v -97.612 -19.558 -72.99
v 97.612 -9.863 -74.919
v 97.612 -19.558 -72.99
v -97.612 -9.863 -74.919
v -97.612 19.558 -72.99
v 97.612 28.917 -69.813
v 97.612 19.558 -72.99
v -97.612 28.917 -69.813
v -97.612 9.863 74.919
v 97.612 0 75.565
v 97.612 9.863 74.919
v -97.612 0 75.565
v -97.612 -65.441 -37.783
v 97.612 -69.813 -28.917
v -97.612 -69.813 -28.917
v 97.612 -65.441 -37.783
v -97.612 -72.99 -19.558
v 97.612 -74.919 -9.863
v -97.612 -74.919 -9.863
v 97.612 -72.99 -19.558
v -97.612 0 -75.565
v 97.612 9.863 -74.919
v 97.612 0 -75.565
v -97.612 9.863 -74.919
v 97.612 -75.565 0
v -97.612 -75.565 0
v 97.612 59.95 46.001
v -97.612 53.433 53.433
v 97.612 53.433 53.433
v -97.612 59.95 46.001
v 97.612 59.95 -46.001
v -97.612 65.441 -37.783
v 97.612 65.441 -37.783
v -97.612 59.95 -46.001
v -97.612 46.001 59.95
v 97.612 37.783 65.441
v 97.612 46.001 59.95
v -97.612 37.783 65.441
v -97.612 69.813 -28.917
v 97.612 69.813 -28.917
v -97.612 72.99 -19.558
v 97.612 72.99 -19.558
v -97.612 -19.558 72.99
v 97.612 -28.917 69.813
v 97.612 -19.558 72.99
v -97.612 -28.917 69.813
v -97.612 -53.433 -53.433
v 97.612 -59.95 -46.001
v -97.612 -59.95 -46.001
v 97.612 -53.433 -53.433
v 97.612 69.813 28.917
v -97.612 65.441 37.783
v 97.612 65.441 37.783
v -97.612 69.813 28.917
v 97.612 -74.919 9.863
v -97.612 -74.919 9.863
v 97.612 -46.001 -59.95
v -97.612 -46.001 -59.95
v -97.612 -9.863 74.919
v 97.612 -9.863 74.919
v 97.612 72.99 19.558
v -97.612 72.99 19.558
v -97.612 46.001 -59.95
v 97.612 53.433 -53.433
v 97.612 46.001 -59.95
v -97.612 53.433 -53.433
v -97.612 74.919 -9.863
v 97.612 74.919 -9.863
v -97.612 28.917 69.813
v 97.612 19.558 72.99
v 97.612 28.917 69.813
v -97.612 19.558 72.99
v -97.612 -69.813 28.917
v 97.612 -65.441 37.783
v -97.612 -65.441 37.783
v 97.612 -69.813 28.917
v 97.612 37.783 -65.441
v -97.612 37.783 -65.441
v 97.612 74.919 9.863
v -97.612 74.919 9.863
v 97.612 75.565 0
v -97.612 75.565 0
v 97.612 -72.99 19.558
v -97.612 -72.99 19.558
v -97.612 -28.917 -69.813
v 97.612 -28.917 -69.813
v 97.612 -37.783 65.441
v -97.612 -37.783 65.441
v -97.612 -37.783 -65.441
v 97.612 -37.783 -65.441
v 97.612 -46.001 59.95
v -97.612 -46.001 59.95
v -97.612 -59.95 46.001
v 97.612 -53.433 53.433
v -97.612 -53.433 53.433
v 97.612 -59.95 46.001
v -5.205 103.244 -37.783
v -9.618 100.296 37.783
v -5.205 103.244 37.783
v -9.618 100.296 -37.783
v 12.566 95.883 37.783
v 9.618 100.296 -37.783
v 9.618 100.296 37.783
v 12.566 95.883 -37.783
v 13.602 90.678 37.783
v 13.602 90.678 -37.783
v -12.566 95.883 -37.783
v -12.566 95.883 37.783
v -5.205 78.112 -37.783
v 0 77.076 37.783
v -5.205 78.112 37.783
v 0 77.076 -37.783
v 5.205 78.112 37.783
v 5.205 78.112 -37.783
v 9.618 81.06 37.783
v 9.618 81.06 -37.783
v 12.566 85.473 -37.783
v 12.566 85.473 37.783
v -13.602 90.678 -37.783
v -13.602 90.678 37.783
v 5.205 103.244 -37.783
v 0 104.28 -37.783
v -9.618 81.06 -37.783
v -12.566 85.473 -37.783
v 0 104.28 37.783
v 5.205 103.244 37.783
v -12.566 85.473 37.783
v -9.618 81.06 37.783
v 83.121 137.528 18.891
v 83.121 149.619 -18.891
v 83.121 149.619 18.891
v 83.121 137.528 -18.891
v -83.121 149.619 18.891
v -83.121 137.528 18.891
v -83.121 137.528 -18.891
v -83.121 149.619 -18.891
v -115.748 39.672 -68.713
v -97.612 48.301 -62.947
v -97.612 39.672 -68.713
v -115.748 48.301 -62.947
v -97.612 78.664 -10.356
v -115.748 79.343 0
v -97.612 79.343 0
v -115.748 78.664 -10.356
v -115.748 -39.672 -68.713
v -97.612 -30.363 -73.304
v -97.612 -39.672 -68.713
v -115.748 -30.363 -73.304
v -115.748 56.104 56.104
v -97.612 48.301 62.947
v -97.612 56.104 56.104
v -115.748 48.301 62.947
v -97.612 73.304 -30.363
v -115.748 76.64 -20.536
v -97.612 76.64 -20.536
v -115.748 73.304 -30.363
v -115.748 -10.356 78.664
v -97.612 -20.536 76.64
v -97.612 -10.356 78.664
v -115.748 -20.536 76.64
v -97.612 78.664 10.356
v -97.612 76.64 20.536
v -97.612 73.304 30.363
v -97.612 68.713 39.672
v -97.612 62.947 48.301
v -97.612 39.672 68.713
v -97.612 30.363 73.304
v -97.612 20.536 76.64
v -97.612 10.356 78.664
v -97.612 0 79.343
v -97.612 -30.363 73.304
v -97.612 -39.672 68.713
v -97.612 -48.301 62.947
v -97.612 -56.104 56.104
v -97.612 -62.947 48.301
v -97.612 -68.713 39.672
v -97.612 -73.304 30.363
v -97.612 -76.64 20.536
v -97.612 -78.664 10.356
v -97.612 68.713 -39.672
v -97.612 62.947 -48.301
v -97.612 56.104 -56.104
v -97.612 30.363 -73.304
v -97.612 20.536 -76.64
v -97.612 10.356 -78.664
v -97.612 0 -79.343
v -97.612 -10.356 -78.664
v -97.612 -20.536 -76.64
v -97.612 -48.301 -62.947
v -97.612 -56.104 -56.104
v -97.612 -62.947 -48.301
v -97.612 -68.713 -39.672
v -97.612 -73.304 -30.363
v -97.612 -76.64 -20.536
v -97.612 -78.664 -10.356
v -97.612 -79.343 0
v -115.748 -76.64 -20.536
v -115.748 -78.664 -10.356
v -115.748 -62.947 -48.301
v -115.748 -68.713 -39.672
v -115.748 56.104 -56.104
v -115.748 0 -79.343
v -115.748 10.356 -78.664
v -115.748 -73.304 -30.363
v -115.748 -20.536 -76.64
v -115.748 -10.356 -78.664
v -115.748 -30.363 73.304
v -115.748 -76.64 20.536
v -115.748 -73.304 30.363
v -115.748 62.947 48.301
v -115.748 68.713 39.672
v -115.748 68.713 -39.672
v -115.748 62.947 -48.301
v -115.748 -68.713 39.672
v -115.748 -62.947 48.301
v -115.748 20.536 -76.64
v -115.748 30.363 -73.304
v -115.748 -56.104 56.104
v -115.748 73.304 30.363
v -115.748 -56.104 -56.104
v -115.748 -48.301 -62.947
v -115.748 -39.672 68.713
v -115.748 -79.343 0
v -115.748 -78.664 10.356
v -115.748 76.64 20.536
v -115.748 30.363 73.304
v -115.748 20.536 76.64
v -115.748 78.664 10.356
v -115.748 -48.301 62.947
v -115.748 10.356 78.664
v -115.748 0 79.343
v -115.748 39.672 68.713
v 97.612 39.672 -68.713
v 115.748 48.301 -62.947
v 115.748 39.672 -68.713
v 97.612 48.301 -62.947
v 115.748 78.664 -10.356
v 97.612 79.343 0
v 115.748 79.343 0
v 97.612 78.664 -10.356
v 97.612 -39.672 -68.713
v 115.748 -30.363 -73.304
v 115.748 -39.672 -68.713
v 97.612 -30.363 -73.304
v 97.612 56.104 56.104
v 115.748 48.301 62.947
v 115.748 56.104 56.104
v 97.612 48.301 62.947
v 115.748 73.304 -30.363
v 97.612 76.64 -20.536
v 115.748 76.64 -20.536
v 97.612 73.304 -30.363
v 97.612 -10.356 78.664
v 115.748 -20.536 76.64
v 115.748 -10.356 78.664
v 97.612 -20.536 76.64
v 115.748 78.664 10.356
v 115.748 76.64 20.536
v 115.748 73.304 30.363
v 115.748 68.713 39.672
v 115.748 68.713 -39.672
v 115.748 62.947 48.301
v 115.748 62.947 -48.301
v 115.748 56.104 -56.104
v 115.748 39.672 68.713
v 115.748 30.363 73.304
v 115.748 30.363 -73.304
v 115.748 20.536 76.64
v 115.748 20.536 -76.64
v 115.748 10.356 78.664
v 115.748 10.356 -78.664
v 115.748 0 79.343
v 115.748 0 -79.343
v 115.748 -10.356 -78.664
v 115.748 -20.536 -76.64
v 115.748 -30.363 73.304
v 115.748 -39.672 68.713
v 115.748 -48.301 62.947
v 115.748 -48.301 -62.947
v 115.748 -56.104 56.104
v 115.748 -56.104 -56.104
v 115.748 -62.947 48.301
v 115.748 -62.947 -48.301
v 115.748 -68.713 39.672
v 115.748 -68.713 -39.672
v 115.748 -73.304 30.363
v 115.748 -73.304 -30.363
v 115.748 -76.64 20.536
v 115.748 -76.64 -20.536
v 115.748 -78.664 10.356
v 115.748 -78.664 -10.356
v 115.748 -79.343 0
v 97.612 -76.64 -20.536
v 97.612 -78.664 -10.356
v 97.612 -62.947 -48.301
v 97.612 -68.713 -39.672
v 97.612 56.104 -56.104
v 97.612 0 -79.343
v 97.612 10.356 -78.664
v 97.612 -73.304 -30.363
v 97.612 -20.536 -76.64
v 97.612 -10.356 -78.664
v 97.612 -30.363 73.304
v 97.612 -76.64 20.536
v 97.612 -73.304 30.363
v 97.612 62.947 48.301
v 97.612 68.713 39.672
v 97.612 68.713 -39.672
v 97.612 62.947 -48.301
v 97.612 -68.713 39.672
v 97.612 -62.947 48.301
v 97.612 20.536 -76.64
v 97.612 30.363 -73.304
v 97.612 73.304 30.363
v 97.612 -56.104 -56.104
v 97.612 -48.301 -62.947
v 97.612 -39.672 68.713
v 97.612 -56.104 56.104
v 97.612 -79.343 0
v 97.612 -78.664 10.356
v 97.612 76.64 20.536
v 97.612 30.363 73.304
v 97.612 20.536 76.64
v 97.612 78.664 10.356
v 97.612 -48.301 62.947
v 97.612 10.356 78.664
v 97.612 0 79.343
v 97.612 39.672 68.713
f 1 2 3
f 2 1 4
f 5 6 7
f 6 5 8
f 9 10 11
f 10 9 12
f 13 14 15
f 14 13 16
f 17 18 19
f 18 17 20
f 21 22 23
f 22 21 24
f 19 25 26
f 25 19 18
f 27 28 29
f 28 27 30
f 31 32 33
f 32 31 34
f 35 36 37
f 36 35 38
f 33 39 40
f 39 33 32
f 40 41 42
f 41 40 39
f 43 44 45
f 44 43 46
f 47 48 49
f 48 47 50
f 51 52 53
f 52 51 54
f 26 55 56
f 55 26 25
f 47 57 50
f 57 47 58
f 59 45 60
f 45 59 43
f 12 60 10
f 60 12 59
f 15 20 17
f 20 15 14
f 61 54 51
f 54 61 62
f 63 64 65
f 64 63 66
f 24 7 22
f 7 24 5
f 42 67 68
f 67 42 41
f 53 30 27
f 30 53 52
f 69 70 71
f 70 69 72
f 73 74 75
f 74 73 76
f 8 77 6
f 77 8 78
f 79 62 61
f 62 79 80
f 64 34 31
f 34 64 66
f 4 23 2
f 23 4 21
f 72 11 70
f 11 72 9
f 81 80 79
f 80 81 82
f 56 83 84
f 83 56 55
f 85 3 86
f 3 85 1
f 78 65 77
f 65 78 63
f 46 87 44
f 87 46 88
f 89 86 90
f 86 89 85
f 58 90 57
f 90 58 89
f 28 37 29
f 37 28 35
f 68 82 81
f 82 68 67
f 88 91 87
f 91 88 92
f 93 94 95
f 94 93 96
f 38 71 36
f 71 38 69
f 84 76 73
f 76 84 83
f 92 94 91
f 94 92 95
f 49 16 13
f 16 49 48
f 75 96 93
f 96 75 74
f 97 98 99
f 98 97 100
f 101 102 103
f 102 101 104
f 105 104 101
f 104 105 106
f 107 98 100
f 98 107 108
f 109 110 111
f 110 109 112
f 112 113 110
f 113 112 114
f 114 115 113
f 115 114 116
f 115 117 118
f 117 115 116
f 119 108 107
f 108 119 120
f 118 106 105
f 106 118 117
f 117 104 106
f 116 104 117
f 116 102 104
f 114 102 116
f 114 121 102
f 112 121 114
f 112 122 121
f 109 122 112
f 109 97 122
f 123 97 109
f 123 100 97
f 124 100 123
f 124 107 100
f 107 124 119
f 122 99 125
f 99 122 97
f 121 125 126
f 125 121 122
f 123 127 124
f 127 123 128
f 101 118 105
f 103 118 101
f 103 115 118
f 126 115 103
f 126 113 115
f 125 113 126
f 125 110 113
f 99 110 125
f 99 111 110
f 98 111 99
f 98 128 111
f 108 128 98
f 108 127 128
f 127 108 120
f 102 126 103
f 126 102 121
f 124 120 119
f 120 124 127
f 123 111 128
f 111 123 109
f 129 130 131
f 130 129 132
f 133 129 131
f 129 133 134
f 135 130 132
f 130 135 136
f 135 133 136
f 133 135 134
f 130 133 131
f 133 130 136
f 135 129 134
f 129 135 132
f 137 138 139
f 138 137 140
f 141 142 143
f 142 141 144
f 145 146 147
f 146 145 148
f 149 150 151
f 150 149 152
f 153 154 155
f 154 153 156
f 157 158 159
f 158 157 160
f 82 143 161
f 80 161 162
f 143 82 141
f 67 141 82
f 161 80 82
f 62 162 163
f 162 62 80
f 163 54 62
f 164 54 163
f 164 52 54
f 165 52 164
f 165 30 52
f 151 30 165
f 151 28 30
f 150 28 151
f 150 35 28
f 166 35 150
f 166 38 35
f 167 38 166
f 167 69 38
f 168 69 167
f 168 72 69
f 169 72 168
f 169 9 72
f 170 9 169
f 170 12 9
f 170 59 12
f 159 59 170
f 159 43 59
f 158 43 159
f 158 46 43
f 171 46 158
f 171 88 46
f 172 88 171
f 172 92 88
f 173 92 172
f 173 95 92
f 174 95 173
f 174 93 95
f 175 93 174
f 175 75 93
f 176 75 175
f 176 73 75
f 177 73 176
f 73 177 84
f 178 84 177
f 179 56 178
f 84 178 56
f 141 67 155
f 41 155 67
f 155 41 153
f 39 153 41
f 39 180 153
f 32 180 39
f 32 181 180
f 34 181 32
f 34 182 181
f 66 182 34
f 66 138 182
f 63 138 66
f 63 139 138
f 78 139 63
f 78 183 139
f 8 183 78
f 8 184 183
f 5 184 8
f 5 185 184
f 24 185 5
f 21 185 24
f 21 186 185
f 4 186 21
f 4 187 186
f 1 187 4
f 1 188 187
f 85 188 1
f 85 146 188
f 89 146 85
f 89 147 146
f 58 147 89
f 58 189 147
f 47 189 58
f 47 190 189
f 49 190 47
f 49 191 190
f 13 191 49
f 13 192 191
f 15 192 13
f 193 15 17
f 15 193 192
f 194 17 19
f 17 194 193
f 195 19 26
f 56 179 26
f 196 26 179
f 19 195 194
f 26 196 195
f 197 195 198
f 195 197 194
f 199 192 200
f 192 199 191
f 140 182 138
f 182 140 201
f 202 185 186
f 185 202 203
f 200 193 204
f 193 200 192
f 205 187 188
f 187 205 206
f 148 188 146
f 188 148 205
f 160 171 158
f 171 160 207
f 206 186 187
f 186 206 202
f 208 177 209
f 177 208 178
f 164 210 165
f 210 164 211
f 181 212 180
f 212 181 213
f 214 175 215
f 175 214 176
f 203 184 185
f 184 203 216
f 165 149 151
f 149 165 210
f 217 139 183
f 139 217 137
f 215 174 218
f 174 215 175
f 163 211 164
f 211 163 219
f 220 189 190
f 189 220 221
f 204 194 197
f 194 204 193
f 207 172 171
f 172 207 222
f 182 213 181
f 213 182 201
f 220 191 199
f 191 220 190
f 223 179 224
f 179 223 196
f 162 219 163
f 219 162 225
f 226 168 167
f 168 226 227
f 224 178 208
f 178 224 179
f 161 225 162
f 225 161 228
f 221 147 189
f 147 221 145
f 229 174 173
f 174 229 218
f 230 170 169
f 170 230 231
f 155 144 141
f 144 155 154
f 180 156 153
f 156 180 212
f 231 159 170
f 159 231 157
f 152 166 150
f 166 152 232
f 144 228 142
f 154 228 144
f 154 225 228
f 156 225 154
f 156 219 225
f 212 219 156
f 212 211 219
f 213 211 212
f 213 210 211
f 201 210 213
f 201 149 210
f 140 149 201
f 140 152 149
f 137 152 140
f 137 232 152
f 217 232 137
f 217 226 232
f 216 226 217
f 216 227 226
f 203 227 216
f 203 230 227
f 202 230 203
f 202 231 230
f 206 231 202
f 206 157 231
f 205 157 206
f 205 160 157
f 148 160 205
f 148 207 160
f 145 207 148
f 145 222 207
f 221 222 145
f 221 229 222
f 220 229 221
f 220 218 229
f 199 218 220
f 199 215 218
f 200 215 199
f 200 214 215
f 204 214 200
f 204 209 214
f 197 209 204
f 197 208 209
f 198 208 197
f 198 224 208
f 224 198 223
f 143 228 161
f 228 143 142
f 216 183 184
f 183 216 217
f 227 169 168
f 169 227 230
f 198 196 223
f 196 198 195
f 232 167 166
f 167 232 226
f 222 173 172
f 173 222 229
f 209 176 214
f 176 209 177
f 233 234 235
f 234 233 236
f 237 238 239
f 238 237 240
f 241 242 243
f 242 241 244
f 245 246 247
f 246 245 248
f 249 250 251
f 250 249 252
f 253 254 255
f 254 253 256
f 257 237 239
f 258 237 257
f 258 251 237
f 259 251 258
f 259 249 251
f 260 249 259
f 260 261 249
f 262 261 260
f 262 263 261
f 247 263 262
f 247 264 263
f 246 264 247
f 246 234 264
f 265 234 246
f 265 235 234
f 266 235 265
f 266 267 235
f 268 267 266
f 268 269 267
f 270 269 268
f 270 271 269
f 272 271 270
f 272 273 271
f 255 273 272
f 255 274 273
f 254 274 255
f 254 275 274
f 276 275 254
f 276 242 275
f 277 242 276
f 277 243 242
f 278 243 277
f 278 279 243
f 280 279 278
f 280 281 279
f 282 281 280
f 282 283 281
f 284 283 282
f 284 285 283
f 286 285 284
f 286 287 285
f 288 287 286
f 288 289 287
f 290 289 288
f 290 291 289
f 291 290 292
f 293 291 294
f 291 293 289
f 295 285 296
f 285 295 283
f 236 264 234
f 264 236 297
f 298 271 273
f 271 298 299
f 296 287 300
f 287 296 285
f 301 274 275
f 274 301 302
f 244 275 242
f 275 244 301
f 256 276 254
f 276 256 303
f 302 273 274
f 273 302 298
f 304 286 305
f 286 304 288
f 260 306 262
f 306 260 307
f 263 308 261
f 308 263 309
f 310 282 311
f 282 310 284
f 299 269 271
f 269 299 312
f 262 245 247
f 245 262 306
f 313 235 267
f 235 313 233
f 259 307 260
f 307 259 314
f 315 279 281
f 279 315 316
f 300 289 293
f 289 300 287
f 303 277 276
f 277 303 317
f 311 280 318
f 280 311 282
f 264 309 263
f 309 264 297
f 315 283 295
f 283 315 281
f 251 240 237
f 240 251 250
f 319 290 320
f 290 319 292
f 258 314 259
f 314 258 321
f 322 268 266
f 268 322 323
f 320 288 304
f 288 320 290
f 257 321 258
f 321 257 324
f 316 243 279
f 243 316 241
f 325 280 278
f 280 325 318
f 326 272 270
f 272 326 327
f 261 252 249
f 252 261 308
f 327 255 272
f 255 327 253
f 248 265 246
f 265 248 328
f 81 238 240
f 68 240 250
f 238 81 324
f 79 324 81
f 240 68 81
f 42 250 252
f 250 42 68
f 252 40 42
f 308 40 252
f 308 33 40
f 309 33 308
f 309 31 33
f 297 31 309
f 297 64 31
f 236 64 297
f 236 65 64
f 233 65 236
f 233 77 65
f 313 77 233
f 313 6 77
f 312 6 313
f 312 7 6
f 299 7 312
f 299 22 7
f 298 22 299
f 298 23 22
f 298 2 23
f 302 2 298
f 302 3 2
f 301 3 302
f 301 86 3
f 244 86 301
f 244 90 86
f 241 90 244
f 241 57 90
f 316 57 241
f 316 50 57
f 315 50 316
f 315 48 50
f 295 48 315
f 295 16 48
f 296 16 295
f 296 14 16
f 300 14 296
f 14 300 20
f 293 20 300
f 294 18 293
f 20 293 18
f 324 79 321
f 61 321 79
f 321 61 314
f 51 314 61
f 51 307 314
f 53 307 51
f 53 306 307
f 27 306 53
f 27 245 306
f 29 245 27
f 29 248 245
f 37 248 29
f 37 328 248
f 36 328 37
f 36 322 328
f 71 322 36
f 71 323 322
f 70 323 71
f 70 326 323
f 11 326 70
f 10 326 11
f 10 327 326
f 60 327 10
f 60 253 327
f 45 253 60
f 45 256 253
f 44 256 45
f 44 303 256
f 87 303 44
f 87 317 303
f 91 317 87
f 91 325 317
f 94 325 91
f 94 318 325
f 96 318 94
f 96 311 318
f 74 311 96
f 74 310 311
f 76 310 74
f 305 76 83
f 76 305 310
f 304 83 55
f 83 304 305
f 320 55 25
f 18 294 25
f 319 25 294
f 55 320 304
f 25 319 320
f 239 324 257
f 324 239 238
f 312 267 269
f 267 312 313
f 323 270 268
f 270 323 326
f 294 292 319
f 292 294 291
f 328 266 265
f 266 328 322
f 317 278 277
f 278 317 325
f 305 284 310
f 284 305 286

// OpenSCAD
// Auto-generated by scripts/author_from_manifest.py (Phase D.3).
// Source: data/phase_d_manifest.json (sku_intent='nibco-lc-2000-butterfly-3in').
// Do not hand-edit — regenerate from the manifest.
//
// @part nibco_lc_2000_butterfly_3in
// @kind valve
// @category valve.butterfly
// @display-name "Nibco LC-2000 Grooved Butterfly Valve 3\" w/ Tamper Switch"
// @mfg nibco
// @mfg-pn LC-2000
// @listing UL FM
// @price-usd 255.00
// @install-minutes 30
// @crew foreman
// @param size_in number default=3 label="Size" unit="in"
// @port inlet position=[-0.05,0,0] direction=[-1,0,0] style=grooved size_in=3 role=run_a
// @port outlet position=[0.05,0,0] direction=[1,0,0] style=grooved size_in=3 role=run_b

size_in = 3.0;

function od_mm(nps) =
    nps ==   1  ? 33.4 :
    nps == 1.25 ? 42.2 :
    nps == 1.5  ? 48.3 :
    nps ==   2  ? 60.3 :
    nps == 2.5  ? 73.0 :
    nps ==   3  ? 88.9 :
    nps ==   4  ? 114.3 :
    nps ==   6  ? 168.3 :
    nps ==   8  ? 219.1 : 73.0;

od = od_mm(size_in);
body_len = od * 2.4;
body_d   = od * 1.7;

union() {
    // Valve body
    rotate([0, 90, 0])
        cylinder(h = body_len, d = body_d, center = true, $fn = 48);
    // Stem / handle indicator
    translate([0, body_d * 0.6, 0])
        cylinder(h = body_d * 0.5, d = body_d * 0.18, center = true, $fn = 16);
    translate([0, body_d * 0.95, 0])
        cube([body_d * 1.1, body_d * 0.08, body_d * 0.25], center = true);
    // End flanges
    translate([-body_len/2, 0, 0])
        rotate([0, 90, 0])
        cylinder(h = body_d * 0.12, d = body_d * 1.05, center = true, $fn = 48);
    translate([ body_len/2, 0, 0])
        rotate([0, 90, 0])
        cylinder(h = body_d * 0.12, d = body_d * 1.05, center = true, $fn = 48);
}
